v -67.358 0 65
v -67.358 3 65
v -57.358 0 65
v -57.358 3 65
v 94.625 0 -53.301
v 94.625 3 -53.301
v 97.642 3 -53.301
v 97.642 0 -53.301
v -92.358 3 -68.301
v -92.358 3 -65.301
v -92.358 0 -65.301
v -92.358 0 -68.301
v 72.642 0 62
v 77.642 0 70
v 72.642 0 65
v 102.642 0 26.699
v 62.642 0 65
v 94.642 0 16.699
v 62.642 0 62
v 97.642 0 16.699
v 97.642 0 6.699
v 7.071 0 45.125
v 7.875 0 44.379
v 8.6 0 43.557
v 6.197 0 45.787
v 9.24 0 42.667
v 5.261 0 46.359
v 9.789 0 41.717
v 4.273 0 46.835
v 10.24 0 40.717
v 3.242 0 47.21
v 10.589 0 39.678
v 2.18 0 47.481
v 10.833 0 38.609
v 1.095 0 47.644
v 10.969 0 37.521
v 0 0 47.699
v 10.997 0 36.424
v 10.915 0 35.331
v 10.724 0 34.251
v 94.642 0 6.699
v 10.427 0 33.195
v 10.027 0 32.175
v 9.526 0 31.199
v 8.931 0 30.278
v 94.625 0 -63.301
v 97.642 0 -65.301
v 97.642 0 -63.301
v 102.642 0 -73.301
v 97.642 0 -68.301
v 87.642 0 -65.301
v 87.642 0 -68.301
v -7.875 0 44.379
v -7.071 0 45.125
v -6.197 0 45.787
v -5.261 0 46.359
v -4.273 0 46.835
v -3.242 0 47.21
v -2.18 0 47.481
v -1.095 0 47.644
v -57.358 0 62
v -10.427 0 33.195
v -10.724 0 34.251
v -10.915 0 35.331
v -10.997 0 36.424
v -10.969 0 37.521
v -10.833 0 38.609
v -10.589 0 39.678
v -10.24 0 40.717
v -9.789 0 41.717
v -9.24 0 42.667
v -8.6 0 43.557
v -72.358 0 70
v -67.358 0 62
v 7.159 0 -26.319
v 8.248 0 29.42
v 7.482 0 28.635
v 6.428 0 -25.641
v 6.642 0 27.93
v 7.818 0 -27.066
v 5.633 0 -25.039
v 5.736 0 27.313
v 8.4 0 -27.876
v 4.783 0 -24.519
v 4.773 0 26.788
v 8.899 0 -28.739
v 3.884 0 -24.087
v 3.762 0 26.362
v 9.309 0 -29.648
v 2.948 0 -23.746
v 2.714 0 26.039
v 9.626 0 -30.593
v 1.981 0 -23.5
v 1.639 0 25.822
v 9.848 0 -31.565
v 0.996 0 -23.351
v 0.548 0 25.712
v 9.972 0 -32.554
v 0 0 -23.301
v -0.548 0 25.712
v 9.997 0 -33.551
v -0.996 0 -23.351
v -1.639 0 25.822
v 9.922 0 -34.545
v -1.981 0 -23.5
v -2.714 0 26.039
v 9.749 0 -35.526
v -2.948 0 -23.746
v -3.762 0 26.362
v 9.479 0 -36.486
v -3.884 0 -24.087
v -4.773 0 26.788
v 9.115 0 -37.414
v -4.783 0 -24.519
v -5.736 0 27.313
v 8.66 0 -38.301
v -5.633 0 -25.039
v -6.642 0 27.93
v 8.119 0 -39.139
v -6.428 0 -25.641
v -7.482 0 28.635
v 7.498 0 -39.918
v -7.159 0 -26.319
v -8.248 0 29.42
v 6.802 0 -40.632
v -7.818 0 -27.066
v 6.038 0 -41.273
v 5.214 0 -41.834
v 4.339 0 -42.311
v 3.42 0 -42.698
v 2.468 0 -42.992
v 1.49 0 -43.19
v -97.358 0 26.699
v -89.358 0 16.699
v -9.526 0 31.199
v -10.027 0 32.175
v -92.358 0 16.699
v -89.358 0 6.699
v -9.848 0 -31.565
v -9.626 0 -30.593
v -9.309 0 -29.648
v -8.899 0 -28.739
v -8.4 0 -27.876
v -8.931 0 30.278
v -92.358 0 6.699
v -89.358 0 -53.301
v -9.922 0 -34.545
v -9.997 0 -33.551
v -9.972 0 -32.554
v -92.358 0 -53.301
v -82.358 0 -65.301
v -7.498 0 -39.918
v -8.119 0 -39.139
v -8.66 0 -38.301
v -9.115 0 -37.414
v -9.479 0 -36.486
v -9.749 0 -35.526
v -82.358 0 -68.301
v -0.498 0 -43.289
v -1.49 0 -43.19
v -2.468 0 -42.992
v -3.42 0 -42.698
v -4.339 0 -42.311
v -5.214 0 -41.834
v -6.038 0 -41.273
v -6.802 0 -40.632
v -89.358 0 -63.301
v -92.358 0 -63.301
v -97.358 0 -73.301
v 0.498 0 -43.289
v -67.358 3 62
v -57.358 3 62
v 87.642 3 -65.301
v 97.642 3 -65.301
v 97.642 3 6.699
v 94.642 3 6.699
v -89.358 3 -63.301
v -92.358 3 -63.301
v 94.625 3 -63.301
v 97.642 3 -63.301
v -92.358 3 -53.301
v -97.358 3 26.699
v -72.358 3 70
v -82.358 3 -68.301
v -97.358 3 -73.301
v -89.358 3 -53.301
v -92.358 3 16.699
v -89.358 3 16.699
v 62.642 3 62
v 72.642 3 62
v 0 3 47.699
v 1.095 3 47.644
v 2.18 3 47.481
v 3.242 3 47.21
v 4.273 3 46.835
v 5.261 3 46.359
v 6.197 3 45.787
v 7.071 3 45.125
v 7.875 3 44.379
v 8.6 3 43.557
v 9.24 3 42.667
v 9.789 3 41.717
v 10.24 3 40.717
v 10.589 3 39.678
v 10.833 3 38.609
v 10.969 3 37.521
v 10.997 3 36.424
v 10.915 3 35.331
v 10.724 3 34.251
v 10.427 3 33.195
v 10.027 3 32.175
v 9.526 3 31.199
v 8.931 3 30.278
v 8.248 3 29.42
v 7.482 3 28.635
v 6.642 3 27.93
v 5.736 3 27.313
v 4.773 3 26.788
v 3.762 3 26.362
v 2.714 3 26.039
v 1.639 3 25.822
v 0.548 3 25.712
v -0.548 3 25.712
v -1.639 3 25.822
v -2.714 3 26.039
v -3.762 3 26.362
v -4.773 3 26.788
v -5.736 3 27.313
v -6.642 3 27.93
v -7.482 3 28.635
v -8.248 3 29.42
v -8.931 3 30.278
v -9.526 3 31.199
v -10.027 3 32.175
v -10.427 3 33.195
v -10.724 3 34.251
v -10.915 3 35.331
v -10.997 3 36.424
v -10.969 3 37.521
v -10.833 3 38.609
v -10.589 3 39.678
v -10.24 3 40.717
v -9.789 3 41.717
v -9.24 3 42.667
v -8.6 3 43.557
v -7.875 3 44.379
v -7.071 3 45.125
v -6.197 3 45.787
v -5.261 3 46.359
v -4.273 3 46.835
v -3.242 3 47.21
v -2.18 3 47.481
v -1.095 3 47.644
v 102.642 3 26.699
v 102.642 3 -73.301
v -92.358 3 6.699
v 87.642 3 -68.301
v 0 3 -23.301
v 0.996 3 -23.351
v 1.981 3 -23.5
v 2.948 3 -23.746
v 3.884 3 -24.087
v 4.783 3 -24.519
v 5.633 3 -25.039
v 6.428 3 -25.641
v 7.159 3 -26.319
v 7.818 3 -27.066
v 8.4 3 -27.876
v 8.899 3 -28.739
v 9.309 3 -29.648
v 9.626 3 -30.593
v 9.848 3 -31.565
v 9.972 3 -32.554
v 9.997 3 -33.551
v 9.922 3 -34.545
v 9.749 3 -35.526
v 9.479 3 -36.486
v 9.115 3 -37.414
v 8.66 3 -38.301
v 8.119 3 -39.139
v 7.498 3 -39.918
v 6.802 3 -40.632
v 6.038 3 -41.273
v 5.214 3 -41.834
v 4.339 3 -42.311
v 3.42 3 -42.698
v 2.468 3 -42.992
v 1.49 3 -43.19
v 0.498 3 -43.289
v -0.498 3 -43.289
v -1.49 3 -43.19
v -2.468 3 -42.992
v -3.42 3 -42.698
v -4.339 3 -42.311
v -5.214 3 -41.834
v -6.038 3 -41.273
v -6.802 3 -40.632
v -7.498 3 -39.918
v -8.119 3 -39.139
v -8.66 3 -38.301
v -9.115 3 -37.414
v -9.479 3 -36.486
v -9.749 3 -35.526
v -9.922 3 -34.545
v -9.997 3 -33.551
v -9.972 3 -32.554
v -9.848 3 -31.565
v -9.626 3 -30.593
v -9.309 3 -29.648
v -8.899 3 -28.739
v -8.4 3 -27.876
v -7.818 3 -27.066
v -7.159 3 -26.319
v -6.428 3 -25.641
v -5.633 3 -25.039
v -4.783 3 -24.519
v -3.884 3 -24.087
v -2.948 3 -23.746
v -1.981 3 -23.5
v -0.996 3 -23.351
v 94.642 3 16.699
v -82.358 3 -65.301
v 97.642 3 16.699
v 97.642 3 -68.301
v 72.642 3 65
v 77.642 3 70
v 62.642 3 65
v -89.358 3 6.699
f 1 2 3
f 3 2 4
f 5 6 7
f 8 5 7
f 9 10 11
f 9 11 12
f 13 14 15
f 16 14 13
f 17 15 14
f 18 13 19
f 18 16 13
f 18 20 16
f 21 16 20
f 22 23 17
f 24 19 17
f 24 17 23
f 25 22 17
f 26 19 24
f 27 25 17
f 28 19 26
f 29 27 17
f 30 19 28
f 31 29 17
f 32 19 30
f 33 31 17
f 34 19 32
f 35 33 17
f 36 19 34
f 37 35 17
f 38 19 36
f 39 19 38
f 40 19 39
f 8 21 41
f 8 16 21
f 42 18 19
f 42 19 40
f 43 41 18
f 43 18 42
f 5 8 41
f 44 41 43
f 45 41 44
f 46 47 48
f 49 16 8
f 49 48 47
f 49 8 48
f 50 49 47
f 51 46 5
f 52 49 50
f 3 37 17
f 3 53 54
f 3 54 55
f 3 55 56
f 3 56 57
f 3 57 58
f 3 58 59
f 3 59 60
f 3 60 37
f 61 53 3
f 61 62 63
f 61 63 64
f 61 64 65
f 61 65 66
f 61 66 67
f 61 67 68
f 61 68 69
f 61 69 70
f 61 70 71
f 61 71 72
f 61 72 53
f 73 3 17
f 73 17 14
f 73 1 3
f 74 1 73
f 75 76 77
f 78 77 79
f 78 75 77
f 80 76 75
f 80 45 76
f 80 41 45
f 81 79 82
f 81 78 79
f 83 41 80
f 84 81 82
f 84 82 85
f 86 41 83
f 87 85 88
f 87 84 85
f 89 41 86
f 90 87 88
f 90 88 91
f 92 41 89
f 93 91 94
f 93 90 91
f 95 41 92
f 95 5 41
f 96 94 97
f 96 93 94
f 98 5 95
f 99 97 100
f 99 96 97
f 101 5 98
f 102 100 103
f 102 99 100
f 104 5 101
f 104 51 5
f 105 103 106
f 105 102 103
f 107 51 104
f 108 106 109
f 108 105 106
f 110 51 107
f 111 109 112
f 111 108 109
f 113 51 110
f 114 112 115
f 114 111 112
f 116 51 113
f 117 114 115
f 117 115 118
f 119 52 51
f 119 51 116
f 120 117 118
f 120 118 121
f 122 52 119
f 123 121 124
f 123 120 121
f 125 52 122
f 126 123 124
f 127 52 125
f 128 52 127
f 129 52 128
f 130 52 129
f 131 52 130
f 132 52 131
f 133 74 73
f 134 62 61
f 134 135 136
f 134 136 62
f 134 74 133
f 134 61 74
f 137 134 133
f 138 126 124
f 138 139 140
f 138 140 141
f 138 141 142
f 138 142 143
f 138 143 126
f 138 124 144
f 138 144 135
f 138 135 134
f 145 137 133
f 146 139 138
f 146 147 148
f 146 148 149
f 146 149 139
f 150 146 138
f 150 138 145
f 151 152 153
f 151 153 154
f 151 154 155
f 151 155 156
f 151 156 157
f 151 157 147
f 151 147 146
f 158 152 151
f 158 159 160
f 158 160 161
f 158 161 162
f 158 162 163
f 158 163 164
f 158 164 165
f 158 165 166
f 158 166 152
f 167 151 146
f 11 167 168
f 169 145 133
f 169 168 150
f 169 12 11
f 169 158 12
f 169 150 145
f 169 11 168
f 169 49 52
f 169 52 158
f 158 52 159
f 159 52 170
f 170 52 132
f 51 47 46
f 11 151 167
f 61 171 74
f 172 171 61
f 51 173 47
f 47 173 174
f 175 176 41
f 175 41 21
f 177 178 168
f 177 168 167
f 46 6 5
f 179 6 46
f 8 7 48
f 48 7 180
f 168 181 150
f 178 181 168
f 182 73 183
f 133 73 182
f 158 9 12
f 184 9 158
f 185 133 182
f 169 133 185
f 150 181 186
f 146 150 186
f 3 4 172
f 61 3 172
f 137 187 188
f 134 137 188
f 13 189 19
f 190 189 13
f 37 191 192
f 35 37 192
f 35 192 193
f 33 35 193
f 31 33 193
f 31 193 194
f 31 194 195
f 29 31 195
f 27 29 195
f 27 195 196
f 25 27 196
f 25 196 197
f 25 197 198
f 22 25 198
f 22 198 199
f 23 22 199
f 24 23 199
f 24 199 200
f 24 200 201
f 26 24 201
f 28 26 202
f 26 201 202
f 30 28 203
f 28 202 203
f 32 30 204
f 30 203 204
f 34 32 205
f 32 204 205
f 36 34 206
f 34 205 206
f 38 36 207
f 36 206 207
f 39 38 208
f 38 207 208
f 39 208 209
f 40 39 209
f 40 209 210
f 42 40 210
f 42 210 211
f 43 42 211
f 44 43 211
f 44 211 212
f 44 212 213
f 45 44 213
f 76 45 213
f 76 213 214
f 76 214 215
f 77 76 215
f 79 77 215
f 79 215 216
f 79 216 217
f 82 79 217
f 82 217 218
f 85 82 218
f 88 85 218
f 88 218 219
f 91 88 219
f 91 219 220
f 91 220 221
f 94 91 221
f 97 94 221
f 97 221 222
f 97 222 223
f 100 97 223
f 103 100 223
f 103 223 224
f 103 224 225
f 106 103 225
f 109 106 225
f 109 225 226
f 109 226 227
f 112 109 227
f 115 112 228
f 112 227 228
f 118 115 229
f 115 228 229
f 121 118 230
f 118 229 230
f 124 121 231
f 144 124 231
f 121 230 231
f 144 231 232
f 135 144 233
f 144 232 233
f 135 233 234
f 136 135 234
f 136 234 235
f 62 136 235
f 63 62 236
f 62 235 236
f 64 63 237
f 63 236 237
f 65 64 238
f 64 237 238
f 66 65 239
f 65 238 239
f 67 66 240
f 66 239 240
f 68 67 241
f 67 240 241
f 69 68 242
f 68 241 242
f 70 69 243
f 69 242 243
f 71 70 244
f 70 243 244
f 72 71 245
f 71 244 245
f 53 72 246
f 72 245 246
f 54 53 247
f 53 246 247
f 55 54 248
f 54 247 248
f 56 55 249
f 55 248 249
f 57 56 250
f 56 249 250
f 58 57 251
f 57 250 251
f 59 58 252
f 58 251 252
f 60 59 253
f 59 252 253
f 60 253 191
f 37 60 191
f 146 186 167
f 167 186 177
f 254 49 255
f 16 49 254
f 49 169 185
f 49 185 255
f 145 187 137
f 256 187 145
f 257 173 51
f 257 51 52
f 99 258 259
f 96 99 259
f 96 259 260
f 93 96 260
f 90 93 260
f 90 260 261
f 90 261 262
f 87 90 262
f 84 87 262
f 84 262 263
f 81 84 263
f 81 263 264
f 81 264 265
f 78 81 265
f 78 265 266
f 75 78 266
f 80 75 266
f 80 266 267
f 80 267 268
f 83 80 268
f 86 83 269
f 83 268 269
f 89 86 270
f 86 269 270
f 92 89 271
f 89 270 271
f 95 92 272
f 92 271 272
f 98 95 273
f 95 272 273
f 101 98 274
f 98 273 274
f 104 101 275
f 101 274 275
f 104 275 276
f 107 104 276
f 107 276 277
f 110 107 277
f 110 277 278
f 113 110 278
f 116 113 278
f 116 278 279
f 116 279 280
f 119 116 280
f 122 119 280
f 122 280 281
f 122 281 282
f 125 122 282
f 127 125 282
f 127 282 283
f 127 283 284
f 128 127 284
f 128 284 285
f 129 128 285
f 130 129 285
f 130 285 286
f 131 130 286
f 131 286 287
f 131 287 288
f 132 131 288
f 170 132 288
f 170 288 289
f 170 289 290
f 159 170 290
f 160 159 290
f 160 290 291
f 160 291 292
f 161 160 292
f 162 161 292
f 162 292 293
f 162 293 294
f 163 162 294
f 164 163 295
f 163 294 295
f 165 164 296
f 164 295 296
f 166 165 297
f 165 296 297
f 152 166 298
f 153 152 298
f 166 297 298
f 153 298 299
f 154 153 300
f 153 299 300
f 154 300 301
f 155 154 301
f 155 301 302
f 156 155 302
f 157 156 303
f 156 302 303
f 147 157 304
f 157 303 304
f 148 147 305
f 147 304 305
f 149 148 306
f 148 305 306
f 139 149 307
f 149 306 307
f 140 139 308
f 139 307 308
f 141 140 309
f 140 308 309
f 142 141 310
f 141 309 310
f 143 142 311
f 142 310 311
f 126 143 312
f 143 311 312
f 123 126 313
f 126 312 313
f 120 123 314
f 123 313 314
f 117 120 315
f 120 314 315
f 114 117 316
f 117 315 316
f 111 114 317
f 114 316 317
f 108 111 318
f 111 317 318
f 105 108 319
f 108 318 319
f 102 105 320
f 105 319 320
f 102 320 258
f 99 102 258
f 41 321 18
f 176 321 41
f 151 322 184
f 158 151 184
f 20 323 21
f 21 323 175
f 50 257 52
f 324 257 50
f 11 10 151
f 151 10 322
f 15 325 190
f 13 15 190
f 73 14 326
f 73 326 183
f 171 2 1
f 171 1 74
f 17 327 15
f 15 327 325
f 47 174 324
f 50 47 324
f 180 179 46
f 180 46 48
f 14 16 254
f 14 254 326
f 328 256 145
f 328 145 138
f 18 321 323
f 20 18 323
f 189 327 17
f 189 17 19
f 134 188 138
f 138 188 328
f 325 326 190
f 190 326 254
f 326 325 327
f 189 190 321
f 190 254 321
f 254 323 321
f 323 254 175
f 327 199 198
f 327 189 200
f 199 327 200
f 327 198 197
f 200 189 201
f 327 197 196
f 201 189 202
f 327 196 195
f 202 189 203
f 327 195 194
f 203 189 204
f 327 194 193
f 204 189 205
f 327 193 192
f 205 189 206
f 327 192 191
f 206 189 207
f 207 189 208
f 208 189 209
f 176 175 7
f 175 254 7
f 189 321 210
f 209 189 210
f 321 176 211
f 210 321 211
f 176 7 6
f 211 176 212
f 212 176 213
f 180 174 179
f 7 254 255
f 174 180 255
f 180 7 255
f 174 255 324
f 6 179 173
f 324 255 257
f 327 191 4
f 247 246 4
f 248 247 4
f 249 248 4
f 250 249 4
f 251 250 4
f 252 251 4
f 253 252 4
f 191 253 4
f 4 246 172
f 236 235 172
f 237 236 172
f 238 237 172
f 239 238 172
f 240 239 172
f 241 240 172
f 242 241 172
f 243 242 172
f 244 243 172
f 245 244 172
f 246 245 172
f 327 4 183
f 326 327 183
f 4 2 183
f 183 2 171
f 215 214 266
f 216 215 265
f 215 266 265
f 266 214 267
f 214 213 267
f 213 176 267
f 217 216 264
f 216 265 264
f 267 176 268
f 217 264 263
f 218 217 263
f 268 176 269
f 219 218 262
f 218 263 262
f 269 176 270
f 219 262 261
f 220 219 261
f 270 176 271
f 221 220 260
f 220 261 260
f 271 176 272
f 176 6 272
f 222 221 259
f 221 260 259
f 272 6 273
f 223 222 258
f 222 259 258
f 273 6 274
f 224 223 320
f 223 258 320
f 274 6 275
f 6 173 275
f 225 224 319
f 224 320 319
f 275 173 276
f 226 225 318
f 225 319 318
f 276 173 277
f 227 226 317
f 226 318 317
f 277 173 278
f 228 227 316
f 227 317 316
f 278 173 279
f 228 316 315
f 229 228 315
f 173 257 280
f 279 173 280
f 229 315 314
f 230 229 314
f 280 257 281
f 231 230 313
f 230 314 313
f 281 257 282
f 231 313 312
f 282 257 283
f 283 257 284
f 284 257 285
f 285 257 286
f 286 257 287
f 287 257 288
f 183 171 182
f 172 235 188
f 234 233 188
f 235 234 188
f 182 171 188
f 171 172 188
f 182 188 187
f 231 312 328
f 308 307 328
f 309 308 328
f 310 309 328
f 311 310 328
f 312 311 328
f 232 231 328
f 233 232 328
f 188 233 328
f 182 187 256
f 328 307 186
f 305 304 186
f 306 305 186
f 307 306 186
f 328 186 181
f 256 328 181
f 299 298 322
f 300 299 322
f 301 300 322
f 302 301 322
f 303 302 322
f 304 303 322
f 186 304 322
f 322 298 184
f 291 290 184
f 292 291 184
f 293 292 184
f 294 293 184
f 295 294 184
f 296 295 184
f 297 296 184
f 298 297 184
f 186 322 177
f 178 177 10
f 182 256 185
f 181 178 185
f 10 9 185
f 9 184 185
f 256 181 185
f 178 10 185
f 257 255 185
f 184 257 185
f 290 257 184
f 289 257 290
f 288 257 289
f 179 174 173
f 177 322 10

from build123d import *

# Parameters (mm, degrees)
RESSALTO_EXTRUS_O1_DEPTH = 3
ESBO_O3_W                = 10
ESBO_O3_H                = 3
ESBO_O3_W_2              = 3
ESBO_O3_H_2              = 10
ESBO_O3_W_3              = 3.017337907
CORTE_EXTRUS_O1_DEPTH    = 3
ESBO_O5_R                = 10
ESBO_O5_R_2              = 11
CORTE_EXTRUS_O2_DEPTH    = 10


with BuildPart() as part:
    # Esboço1 → Ressalto-extrusão1 (new body)
    with BuildSketch(Plane(origin=(0, 0, 0), x_dir=(1, 0, 0), z_dir=(0, 1, 0))):
        Polygon((-97.357643635, -26.698729811), (-97.357643635, 73.301270189), (102.642356365, 73.301270189), (102.642356365, -26.698729811), (77.642356365, -70), (-72.357643635, -70), align=None)
    extrude(amount=RESSALTO_EXTRUS_O1_DEPTH)

    # Esboço3 → Corte-extrusão1 (cut)
    with BuildSketch(Plane(origin=(0, 3, 0), x_dir=(1, 0, 0), z_dir=(0, 1, 0))):
        with Locations((-62.357643635, -63.5)):
            Rectangle(ESBO_O3_W, ESBO_O3_H)
        with Locations((67.642356365, -63.5)):
            Rectangle(ESBO_O3_W, ESBO_O3_H)
        with Locations((96.142356365, -11.698729811)):
            Rectangle(ESBO_O3_W_2, ESBO_O3_H_2)
        with Locations((96.133687412, 58.301270189)):
            Rectangle(ESBO_O3_W_3, ESBO_O3_H_2)
        with Locations((92.642356365, 66.801270189)):
            Rectangle(ESBO_O3_W, ESBO_O3_H)
        with Locations((-90.857643635, -11.698729811)):
            Rectangle(ESBO_O3_W_2, ESBO_O3_H_2)
        with Locations((-90.857643635, 58.301270189)):
            Rectangle(ESBO_O3_W_2, ESBO_O3_H_2)
        with Locations((-87.357643635, 66.801270189)):
            Rectangle(ESBO_O3_W, ESBO_O3_H)
    extrude(amount=-CORTE_EXTRUS_O1_DEPTH, mode=Mode.SUBTRACT)

    # Esboço5 → Corte-extrusão2 (cut)
    with BuildSketch(Plane(origin=(0, 3, 0), x_dir=(1, 0, 0), z_dir=(0, 1, 0))):
        with Locations(Location((0, 33.301270189, 0), (0, 0, 270))):
            Circle(ESBO_O5_R)
        with Locations(Location((0, -36.698729811, 0), (0, 0, 270))):
            Circle(ESBO_O5_R_2)
    extrude(amount=-CORTE_EXTRUS_O2_DEPTH, mode=Mode.SUBTRACT)


solid = part.part
